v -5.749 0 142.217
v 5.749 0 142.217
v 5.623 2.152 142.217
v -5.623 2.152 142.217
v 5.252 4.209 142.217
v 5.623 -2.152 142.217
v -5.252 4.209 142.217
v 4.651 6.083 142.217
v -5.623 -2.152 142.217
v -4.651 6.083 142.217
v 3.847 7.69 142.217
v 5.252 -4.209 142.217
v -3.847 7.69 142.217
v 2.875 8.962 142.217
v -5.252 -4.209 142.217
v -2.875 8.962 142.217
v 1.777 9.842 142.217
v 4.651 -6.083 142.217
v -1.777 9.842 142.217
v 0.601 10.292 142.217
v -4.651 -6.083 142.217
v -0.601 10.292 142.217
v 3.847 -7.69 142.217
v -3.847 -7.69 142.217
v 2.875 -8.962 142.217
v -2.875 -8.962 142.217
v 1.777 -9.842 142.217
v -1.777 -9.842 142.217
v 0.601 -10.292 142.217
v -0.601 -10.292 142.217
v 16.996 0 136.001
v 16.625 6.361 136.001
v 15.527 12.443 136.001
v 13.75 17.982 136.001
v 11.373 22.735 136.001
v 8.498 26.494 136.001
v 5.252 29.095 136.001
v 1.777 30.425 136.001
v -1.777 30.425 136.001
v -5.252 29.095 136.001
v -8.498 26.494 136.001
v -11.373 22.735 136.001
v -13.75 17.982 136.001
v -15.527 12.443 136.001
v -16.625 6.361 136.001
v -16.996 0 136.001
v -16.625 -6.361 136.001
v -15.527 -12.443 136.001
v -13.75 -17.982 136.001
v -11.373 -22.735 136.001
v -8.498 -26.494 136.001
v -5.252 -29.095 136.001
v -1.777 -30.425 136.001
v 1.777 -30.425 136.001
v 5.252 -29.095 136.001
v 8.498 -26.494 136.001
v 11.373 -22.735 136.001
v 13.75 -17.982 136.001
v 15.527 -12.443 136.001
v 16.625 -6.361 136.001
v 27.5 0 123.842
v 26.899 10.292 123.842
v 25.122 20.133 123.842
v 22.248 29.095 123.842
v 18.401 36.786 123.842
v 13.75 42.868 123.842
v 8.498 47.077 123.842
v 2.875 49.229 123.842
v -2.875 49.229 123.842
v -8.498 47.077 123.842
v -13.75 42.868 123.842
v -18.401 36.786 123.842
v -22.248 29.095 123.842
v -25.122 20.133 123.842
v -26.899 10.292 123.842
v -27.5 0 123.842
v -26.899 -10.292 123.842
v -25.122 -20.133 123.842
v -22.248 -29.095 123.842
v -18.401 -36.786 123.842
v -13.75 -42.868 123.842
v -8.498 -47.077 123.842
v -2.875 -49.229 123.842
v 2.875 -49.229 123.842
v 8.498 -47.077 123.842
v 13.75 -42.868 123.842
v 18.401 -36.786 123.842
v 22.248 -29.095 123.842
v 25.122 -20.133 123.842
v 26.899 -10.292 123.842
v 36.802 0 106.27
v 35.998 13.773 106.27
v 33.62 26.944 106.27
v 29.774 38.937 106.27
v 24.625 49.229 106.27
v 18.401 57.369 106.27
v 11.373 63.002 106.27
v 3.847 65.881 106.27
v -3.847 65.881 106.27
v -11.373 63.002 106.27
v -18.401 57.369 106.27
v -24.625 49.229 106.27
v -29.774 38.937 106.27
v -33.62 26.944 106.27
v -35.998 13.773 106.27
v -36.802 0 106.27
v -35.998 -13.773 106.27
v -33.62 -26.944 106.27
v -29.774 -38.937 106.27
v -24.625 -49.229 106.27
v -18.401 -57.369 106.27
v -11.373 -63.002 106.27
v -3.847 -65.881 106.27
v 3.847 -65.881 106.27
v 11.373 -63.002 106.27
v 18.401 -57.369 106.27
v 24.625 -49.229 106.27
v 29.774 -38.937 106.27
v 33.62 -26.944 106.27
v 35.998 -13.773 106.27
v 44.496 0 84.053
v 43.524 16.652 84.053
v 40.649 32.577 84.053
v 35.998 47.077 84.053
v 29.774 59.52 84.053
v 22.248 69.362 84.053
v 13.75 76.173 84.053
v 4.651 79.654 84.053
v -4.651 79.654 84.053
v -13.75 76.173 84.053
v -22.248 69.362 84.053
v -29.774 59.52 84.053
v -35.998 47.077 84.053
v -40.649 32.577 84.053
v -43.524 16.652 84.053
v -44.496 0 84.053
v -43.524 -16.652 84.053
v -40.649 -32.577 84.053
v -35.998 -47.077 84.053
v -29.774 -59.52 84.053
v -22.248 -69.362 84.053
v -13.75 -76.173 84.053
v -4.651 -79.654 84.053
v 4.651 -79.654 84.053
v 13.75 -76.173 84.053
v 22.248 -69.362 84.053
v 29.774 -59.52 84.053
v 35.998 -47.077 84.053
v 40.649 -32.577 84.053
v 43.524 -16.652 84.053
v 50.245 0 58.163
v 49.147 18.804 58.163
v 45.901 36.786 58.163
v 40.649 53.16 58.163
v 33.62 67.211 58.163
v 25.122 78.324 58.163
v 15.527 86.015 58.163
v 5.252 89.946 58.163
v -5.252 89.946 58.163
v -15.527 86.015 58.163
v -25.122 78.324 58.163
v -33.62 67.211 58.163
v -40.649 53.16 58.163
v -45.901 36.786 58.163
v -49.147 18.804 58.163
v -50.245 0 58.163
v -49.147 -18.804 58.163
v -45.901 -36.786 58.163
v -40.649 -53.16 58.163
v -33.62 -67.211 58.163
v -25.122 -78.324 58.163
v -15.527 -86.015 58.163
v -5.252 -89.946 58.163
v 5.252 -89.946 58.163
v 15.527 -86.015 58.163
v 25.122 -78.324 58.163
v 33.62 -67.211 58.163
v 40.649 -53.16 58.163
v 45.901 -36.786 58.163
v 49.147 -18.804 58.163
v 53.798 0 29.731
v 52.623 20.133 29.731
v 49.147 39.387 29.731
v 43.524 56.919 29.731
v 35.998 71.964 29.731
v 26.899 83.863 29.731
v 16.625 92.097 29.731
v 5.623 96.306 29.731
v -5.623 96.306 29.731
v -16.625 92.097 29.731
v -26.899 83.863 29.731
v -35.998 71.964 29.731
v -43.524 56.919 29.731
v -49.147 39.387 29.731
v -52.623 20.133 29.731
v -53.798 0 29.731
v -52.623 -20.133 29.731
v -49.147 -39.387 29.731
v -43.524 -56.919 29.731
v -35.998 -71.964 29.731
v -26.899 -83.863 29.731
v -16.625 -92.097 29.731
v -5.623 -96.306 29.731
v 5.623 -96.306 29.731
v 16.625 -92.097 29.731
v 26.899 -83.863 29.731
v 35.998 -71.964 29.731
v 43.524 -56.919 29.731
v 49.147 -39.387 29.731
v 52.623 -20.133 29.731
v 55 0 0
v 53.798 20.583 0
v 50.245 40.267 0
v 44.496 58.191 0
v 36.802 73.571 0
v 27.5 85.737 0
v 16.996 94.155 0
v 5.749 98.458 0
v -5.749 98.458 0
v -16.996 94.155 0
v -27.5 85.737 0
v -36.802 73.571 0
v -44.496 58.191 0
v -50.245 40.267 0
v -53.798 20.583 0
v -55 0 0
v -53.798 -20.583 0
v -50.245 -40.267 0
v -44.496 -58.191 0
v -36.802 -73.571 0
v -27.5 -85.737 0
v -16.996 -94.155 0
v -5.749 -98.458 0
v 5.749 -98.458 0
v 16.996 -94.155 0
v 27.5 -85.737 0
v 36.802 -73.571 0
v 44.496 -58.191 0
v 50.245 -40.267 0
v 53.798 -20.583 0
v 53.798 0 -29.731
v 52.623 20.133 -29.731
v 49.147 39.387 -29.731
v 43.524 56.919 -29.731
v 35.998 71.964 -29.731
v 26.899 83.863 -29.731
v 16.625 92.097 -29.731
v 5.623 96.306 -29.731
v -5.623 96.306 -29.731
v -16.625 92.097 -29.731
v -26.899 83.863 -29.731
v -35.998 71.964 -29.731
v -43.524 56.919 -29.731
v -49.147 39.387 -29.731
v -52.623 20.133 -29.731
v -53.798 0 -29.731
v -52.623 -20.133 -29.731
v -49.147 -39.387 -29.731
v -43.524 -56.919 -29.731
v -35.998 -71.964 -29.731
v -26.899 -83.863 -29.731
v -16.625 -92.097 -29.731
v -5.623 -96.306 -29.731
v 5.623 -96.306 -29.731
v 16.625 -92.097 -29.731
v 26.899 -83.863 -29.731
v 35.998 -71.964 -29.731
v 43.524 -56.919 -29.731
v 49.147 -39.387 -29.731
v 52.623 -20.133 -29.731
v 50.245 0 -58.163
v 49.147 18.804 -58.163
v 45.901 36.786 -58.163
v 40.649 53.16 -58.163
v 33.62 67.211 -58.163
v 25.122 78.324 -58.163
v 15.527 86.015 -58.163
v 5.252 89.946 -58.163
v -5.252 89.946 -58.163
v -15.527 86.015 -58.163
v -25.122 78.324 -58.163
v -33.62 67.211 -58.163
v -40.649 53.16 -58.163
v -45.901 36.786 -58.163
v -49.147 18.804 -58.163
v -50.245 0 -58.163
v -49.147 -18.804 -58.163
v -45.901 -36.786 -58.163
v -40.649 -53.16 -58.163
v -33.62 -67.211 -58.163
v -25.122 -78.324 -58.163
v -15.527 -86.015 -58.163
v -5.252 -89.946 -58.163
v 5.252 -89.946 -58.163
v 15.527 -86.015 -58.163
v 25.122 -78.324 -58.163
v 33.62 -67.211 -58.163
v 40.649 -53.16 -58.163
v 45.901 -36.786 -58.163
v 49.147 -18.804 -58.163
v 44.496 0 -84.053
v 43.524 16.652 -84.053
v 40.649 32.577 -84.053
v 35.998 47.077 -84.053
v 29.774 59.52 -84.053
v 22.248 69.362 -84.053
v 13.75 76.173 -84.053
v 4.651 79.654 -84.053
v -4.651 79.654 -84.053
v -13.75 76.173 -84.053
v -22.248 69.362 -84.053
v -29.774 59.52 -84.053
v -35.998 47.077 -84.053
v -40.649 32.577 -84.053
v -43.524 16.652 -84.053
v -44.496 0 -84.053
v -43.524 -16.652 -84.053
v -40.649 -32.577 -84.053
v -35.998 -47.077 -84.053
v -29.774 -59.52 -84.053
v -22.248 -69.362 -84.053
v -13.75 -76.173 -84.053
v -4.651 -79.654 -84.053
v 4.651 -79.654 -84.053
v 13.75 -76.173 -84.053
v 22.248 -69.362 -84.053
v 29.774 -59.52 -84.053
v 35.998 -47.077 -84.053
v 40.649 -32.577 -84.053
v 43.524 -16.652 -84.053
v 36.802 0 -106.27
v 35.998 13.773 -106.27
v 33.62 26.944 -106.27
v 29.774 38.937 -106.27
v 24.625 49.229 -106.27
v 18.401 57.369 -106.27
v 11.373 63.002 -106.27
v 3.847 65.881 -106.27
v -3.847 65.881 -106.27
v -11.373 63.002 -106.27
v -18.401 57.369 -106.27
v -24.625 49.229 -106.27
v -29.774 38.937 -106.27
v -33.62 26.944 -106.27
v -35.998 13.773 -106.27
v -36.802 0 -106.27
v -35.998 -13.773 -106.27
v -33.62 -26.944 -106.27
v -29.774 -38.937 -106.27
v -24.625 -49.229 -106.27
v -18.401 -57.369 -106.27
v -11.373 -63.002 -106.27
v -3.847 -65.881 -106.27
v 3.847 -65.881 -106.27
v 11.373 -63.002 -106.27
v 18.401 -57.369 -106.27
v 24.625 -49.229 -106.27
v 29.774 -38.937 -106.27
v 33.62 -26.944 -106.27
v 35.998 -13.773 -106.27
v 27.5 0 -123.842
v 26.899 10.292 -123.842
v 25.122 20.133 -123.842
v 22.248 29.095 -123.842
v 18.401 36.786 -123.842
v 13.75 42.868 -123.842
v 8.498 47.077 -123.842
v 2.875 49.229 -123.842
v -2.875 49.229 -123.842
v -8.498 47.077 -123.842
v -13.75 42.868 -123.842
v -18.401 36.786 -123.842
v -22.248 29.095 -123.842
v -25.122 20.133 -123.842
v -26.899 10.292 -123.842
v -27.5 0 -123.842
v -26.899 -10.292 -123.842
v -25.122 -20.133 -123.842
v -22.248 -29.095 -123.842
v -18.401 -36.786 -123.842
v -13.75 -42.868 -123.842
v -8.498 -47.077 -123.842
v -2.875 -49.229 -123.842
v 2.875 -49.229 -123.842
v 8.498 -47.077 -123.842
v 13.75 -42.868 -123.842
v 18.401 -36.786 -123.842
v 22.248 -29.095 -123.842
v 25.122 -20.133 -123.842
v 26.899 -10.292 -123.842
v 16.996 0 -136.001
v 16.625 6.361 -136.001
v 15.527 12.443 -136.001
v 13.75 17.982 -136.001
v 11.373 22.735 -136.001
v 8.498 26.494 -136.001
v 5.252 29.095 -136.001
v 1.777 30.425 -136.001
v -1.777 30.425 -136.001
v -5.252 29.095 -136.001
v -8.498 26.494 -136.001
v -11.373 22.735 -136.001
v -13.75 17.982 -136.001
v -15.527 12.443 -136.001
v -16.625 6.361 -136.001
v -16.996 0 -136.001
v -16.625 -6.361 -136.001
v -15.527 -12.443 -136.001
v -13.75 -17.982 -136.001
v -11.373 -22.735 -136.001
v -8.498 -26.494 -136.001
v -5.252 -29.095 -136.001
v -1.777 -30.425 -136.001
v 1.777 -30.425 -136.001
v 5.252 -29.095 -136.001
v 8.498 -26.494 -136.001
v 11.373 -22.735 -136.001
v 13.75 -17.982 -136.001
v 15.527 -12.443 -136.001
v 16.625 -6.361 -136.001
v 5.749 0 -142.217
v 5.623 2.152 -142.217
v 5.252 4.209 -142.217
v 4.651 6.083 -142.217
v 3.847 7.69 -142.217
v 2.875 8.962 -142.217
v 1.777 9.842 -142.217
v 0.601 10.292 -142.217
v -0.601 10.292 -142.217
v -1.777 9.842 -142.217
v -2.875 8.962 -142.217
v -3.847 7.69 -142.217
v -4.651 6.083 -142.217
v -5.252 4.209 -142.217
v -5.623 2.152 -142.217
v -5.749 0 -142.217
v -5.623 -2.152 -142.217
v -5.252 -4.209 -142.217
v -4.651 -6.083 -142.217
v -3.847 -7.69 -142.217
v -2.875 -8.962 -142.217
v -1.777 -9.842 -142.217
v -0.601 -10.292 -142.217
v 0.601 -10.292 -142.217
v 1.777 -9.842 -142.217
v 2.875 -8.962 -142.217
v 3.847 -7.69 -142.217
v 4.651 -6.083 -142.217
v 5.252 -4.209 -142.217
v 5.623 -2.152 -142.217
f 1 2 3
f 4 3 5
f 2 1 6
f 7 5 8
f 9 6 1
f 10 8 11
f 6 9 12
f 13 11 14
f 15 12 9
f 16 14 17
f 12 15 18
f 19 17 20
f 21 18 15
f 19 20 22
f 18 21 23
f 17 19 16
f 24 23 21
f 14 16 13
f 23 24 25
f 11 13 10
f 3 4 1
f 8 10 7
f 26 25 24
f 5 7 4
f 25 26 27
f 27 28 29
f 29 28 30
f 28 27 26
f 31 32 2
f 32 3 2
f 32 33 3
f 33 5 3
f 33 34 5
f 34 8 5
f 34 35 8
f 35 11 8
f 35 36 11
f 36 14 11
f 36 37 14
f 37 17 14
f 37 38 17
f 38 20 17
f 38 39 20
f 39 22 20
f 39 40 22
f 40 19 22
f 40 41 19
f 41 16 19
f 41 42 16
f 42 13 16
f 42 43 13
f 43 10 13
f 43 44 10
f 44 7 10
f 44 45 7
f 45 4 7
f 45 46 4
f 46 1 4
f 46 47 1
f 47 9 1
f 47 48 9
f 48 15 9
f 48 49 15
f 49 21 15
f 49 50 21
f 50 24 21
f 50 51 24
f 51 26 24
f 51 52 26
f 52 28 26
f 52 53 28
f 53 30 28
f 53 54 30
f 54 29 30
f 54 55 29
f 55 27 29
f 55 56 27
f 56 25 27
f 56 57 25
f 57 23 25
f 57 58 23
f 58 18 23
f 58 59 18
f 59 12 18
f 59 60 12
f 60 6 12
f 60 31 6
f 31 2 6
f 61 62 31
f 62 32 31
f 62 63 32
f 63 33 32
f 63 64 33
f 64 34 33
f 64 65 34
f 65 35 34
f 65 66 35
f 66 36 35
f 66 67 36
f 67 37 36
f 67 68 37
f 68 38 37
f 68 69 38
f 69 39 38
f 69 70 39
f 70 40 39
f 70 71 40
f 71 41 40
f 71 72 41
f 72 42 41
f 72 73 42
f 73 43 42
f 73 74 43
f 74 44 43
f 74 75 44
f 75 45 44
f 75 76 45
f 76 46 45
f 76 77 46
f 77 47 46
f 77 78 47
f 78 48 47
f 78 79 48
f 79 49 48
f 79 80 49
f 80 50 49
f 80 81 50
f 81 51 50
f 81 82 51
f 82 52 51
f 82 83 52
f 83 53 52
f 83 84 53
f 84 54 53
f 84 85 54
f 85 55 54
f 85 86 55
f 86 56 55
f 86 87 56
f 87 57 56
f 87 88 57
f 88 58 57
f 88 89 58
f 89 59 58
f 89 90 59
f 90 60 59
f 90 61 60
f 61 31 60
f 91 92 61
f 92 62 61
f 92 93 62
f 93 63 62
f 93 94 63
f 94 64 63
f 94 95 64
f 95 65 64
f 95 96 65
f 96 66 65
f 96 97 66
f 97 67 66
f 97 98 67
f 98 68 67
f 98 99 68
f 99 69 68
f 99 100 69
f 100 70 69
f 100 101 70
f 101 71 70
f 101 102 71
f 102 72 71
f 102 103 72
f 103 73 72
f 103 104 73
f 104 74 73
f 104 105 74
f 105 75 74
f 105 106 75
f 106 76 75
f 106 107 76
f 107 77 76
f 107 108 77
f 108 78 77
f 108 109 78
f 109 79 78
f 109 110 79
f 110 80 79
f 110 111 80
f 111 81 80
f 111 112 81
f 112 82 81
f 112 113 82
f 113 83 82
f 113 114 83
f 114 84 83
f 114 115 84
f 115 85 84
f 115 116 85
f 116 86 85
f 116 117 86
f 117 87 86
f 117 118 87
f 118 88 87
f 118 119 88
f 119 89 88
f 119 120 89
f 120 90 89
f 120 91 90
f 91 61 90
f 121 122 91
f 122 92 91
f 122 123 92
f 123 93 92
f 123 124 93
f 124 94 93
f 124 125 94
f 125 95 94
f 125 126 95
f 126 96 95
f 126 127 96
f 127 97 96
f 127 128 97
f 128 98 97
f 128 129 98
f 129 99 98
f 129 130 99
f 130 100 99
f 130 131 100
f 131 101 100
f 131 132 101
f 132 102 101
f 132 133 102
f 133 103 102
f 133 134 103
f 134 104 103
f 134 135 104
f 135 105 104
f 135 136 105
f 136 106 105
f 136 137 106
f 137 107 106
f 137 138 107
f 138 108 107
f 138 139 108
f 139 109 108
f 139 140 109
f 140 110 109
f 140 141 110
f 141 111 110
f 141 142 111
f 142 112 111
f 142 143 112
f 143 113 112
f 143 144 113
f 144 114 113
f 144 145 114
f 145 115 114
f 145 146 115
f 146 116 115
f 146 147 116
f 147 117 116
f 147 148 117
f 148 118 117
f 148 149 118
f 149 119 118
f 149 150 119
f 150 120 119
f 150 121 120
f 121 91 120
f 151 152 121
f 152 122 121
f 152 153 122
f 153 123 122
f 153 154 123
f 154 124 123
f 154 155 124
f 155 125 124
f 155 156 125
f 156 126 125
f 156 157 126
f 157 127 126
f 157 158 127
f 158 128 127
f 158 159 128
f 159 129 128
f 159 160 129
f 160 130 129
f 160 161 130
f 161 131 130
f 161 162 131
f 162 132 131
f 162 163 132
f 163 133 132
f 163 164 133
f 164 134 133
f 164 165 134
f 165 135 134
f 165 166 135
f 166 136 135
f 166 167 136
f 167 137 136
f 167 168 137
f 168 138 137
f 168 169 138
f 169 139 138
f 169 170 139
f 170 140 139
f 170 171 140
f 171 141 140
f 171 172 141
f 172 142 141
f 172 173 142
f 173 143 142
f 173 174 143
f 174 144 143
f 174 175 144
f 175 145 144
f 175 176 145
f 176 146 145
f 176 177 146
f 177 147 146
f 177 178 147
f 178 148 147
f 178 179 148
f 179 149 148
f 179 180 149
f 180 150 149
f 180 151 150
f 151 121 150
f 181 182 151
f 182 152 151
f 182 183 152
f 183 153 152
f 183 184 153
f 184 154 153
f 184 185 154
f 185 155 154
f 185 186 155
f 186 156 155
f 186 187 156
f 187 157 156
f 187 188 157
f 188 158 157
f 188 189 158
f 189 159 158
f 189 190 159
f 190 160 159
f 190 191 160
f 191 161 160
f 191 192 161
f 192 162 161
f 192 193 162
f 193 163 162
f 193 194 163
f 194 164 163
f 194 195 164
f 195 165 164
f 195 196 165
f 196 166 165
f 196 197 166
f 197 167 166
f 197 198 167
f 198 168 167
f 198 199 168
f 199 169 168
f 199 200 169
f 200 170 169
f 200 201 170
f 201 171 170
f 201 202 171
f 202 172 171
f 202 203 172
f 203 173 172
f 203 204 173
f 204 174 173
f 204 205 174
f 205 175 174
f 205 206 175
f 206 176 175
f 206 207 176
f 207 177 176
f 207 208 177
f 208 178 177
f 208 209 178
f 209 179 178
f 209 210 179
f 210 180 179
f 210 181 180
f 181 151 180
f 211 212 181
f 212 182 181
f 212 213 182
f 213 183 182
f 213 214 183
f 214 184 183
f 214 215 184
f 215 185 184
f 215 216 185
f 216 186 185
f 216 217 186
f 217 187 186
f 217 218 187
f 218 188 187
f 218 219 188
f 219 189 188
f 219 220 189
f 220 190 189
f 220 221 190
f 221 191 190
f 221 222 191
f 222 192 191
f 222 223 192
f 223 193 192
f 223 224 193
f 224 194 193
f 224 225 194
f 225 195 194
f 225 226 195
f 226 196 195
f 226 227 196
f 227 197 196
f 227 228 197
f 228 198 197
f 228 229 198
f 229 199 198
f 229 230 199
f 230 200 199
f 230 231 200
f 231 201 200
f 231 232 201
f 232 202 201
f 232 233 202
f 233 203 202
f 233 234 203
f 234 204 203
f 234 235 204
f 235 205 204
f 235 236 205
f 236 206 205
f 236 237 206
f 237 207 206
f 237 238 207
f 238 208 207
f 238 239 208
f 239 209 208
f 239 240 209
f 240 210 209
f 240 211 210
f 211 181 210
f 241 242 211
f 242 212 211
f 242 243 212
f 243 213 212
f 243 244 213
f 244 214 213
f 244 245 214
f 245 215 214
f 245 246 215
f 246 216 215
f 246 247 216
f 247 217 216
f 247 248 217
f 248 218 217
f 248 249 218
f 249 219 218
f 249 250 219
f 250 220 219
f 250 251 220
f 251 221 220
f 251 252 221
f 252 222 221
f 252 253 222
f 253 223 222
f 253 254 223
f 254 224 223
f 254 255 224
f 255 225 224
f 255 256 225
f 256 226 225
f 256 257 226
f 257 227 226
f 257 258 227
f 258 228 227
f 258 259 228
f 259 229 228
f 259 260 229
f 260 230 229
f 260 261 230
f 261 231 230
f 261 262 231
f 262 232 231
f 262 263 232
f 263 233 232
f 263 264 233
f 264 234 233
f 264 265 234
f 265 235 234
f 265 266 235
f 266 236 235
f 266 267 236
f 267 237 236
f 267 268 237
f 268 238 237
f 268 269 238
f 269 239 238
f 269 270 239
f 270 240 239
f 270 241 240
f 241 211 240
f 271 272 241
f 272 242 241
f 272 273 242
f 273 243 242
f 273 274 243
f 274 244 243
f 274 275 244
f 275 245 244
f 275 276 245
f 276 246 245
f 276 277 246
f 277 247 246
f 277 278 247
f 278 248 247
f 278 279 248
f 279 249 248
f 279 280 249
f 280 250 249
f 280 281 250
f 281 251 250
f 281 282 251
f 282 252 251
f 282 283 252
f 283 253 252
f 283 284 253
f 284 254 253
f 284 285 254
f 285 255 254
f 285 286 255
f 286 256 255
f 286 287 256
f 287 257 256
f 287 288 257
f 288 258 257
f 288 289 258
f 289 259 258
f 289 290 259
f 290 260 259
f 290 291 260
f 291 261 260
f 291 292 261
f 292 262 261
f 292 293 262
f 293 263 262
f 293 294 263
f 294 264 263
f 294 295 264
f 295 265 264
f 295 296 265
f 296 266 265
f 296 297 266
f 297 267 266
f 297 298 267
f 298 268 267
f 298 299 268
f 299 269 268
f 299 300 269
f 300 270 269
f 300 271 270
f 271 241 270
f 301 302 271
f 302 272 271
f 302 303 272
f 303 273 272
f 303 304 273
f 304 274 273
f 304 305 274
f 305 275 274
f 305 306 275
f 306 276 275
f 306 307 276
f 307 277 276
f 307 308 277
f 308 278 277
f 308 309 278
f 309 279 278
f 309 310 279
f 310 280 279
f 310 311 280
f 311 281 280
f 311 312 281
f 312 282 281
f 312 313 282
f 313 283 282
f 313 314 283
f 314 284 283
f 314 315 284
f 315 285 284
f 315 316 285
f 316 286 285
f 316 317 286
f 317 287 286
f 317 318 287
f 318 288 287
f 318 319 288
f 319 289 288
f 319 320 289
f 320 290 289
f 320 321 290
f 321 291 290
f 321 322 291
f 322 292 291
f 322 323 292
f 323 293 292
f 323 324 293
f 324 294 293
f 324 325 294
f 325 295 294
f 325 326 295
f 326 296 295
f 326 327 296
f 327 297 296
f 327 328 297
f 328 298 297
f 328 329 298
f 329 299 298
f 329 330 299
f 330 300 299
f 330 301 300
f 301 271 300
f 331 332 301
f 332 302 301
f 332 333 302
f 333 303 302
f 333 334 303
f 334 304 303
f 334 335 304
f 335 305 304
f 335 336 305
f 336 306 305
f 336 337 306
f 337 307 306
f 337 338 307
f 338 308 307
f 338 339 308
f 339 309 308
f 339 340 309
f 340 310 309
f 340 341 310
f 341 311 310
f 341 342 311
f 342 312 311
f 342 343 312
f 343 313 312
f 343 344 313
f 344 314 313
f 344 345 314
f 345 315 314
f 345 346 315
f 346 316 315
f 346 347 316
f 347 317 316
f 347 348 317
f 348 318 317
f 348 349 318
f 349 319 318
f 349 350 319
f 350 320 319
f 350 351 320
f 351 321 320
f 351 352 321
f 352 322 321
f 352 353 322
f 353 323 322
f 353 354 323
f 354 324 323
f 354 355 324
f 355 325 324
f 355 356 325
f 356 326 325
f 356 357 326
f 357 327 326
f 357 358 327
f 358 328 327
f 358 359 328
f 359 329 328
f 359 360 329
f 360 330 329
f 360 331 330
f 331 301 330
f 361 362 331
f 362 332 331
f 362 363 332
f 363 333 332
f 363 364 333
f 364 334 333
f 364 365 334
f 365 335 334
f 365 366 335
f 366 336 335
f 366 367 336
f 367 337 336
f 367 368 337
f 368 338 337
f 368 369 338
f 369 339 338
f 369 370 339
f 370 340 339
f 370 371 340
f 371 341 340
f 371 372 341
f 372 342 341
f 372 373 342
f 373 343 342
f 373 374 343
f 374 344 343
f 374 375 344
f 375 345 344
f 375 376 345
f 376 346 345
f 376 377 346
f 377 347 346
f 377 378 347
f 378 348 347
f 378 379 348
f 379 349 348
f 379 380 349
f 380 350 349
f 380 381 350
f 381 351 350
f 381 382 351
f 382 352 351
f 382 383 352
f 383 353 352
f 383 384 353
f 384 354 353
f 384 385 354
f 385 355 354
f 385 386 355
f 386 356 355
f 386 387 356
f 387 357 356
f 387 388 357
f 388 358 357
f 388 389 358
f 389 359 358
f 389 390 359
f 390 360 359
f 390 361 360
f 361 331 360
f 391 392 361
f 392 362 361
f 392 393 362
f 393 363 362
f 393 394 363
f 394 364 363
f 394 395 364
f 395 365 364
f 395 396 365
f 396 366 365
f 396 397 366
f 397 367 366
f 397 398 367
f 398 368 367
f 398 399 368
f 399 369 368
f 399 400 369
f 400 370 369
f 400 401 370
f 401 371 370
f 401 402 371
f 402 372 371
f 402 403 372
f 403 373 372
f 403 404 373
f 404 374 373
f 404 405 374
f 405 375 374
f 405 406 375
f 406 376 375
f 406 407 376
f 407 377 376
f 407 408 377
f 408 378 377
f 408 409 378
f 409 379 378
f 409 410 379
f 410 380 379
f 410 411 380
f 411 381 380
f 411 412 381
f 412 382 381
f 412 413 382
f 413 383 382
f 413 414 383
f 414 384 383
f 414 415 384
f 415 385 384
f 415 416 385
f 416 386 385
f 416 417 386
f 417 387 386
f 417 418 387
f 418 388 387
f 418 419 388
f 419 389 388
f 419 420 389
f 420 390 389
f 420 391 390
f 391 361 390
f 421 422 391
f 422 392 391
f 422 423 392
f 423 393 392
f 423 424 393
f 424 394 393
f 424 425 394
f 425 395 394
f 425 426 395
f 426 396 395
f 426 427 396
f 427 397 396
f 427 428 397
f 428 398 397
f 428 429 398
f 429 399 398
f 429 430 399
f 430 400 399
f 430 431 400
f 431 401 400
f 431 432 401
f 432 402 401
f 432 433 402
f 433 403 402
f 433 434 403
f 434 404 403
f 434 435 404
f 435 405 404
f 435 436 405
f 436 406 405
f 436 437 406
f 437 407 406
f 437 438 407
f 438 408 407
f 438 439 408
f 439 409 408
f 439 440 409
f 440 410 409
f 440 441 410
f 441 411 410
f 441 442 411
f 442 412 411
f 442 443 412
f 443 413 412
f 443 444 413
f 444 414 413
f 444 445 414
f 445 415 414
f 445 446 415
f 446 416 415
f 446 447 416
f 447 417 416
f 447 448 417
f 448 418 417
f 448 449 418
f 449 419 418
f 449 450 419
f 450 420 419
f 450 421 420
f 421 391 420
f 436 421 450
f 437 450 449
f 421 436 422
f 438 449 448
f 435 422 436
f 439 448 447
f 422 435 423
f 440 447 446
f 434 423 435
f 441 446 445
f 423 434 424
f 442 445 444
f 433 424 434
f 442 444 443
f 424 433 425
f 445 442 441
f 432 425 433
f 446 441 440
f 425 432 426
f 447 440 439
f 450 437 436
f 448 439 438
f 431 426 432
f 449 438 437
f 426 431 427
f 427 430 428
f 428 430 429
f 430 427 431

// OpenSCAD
// Generated by SolidPython 1.0.1 on 2020-07-29 00:46:46


scale(v = [5, 9, 13]) {
	sphere(r = 11);
}
/***********************************************
*********      SolidPython code:      **********
************************************************
 
# import packages: SolidPython
from solid import *
from solid.utils import *
from itertools import chain, combinations, permutations


class Resize:

    def __init__(self, scad_file):
        self.scad_file = scad_file
        #self.scad_file = import_scad(scad_file)
        # cone/cylinder param:
        self.r1 = 0
        self.r2 = 0
        self.h = 0
        # rectangular prism param:
        self.w = 0
        self.l = 0
        # ellipse param:
        self.r = 0

    # import OpenScad code (file name corresponds to shape)


    # classify shape + parameters
    def assign(self, param1, param2, param3):
        if self.scad_file == 'cone.scad':
            self.r1 = param1
            self.r2 = param2
            self.h = param3
        elif self.scad_file == 'cylinder.scad':
            self.r1 = param1
            self.r2 = param2
            self.h = param3
        elif self.scad_file == 'rectangularPrism.scad':
            self.h = param1
            self.l = param2
            self.w = param3
        else:
            self.r = param1
            self.h = param2

    # resize parameters
    def iterate(self):
        x = range(3, 20, 2)
        i = 1
        if self.scad_file == 'cone.scad':
            tempList = list(permutations(x, 2))
            for temp in tempList:
                param1 = temp[0]
                param2 = temp[1]
                filepath = 'produced_scad_files/' + 'cone' + str(param1) + '_' + str(param2) + '_' + '.scad'
                scad_render_to_file(cylinder(h=param1, r1=param2, r2=0), filepath)

        elif self.scad_file == 'cylinder.scad':
            tempList = list(permutations(x, 3))
            for temp in tempList:
                param1 = temp[0]
                param2 = temp[1]
                filepath = 'produced_scad_files/' + 'cylinder' + str(param1) + '_' + str(param2) + '_' + '.scad'
                scad_render_to_file(cylinder(h=param1, r1=param2, r2=param2), filepath)

        elif self.scad_file == 'rectangularPrism.scad':
            tempList = list(permutations(x, 3))
            for temp in tempList:
                param1 = temp[0]
                param2 = temp[1]
                param3 = temp[2]
                filepath = 'produced_scad_files/' + 'rectangularPrism' + str(param1) + '_' + str(param2) + '_' + str(
                    param3) + '.scad'
                scad_render_to_file(cube(size=(param1, param2, param3)), filepath)

        elif self.scad_file == 'ellipse.scad':
            tempList = list(permutations(x, 4))
            for temp in tempList:
                param1 = temp[0]
                param2 = temp[1]
                param3 = temp[2]
                param4 = temp[3]
                filepath = 'produced_scad_files/' + 'ellipse' + str(param1) + '_' + str(param2) + '_' + str(param3) + '_' + str(param4) + '.scad'
                scad_render_to_file(scale([param1, param2, param3])(sphere(r=param4)), filepath)

    def render_to_scadfile(self):
        scad_render_to_file(scad, 'example.scad') 
 
************************************************/
